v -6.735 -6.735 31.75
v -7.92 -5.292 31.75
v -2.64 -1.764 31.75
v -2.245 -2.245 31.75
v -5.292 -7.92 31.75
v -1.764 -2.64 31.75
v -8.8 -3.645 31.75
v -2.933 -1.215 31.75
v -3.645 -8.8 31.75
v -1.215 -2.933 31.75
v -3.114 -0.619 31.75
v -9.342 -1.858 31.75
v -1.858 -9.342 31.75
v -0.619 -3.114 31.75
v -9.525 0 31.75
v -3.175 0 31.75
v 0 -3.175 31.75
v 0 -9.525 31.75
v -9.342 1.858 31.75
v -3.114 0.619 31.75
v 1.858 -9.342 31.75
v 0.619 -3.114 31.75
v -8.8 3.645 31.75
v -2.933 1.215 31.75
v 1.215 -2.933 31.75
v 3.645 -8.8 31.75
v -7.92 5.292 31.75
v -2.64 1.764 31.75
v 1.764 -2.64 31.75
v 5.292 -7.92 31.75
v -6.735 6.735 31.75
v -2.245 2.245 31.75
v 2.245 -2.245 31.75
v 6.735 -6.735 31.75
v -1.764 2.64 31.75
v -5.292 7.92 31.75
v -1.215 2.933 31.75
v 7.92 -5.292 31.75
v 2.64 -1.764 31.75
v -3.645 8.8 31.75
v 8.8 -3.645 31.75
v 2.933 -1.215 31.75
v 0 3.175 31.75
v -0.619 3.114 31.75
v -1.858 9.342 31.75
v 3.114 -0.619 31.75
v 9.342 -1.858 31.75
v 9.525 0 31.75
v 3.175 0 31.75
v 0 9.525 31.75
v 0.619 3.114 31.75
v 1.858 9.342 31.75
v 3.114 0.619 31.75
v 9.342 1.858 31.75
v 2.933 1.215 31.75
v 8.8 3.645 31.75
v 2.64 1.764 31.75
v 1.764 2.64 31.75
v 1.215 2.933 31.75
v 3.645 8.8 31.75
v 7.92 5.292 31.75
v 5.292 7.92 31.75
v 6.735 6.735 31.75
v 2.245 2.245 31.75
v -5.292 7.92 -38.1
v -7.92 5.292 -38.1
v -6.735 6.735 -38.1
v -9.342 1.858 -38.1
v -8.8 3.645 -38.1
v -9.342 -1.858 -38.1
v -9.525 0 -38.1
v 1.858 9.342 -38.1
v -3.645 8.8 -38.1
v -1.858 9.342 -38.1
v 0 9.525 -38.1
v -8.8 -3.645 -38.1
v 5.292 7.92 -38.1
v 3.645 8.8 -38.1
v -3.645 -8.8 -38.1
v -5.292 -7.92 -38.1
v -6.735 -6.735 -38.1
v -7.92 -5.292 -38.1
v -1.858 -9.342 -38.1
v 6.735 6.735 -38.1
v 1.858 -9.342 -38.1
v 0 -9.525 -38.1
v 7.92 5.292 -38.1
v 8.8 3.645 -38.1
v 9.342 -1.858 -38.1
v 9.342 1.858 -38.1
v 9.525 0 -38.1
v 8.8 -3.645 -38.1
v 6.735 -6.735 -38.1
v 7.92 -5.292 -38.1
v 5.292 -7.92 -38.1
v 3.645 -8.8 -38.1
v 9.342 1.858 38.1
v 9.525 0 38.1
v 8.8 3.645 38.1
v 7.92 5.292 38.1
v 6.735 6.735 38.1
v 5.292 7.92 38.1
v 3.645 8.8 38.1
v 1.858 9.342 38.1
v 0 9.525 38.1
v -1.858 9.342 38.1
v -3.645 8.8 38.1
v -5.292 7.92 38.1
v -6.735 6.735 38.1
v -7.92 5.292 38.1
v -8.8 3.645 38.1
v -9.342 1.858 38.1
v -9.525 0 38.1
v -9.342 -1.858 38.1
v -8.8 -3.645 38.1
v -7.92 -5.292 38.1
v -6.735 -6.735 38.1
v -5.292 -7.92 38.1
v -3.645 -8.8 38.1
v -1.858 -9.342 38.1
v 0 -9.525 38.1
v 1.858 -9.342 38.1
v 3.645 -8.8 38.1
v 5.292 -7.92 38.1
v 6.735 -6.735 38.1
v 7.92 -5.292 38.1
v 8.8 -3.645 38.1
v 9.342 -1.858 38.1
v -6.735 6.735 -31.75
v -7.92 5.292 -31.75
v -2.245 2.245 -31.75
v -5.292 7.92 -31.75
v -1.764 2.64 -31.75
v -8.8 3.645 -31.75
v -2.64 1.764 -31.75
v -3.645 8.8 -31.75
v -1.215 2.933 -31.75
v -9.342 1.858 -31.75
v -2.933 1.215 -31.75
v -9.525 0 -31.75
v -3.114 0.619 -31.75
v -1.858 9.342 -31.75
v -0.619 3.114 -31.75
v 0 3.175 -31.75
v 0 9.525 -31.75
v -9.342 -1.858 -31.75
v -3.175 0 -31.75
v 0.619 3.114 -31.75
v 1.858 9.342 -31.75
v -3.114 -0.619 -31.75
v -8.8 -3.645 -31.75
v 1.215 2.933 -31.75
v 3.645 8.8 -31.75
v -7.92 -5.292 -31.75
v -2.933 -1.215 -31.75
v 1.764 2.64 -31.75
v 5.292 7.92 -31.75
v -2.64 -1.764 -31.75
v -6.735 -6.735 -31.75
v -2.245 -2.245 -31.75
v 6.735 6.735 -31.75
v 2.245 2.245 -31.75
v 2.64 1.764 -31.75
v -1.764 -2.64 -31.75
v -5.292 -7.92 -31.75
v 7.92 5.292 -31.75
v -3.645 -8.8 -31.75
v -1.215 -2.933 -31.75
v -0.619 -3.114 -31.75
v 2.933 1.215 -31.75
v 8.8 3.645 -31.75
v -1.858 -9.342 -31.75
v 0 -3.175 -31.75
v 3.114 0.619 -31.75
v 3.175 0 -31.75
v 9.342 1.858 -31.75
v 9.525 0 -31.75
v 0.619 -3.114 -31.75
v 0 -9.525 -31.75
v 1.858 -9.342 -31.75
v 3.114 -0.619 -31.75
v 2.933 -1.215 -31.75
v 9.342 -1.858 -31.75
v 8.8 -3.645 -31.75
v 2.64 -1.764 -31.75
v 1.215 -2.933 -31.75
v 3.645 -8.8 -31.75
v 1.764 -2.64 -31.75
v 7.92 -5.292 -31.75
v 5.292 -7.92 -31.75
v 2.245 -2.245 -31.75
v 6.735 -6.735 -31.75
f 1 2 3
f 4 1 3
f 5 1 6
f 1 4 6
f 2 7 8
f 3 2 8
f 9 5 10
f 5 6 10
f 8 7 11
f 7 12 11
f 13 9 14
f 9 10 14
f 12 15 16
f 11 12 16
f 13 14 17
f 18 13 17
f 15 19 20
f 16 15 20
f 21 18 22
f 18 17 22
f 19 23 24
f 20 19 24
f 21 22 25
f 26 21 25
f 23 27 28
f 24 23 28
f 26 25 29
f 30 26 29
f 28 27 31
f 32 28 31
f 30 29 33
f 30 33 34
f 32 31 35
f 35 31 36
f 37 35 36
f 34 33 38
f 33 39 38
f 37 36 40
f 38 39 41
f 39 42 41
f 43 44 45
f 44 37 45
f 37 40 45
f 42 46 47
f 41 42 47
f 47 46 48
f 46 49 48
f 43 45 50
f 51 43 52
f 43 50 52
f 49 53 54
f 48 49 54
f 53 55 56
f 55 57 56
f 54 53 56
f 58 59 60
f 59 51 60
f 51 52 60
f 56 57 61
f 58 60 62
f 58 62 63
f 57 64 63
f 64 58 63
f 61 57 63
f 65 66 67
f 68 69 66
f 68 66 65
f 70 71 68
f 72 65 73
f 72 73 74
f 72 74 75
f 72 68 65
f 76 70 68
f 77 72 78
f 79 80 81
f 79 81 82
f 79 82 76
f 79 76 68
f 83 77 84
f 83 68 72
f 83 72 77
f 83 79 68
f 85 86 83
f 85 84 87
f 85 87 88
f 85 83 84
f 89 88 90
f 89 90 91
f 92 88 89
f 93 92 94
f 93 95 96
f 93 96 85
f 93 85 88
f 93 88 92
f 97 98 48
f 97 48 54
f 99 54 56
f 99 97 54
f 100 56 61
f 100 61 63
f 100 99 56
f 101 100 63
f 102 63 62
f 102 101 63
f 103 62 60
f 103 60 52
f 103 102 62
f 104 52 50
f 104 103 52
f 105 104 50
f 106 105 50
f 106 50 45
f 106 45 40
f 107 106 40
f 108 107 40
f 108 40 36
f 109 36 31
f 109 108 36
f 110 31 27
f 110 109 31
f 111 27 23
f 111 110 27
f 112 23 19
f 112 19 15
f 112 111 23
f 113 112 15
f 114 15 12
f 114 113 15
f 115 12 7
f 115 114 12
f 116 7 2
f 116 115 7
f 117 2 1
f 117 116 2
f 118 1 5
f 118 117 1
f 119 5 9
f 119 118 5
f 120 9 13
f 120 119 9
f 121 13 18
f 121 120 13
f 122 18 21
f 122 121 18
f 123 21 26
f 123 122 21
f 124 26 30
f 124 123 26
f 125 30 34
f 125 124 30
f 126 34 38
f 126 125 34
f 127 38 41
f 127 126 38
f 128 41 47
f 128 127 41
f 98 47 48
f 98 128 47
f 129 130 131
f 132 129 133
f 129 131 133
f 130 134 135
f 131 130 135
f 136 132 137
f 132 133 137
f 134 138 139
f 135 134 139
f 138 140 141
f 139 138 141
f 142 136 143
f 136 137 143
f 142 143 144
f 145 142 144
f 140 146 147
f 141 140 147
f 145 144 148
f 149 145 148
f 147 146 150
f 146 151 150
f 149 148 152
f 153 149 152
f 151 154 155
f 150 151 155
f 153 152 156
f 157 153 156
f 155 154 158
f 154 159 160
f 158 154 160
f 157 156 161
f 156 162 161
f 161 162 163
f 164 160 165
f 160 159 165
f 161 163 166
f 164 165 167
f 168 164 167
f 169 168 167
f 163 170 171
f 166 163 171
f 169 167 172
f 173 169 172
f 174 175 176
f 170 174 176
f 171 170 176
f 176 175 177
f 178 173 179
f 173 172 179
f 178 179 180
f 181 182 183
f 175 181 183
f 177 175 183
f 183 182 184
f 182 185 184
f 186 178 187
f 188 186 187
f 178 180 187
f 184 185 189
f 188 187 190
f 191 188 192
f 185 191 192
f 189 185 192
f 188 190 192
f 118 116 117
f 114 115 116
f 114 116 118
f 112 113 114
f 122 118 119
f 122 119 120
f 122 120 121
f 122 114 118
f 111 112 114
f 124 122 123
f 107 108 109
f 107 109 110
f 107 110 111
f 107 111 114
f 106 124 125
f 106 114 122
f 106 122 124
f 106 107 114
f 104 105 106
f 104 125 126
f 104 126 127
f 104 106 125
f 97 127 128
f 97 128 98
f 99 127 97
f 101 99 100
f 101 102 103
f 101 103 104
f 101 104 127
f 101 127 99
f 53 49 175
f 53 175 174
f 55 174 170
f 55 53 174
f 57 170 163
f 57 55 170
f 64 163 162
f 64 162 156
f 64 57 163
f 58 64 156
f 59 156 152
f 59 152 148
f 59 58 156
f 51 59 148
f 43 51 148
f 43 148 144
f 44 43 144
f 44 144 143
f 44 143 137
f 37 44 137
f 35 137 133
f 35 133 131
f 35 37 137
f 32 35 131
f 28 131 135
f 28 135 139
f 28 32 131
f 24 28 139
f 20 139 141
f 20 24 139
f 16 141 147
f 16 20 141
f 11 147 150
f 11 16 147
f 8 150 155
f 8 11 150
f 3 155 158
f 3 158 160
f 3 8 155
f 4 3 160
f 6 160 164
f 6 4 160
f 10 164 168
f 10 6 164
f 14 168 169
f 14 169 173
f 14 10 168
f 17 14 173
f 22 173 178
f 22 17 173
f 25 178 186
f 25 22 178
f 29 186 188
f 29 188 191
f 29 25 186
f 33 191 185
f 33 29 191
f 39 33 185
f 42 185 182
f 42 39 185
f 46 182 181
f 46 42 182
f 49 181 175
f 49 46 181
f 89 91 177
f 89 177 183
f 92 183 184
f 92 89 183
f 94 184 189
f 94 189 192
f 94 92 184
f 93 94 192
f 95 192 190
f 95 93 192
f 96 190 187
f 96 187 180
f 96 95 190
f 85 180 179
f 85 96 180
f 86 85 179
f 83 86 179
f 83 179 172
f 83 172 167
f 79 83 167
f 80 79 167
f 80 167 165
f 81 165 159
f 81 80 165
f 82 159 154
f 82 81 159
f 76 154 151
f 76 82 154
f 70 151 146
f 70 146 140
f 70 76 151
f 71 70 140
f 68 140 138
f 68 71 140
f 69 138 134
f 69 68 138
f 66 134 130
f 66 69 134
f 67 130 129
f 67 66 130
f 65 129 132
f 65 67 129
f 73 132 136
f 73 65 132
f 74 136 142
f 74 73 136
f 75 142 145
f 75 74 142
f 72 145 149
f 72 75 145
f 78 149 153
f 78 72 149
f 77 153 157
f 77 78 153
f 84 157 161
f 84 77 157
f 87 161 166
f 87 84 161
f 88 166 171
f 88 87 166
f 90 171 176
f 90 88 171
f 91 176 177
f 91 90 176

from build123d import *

# Parameters (mm, degrees)
F0_R     = 3.175
F1_DEPTH = 38.1
F2_R     = 9.525
F3_DEPTH = 6.35
F4_R     = 9.525
F5_DEPTH = 6.35


with BuildPart() as f1:
    # F0 (on Top) → F1 (new body, symmetric)
    with BuildSketch(Plane.XY):
        Circle(F0_R)
    extrude(amount=F1_DEPTH, both=True)

    # F2 (on face) → F3 (join)
    with BuildSketch(Plane(origin=(0, 0, -38.1), x_dir=(1, 0, 0), z_dir=(0, 0, -1))):
        Circle(F2_R)
    extrude(amount=-F3_DEPTH)

    # F4 (on face) → F5 (join)
    with BuildSketch(Plane.XY.offset(38.1)):
        Circle(F4_R)
    extrude(amount=-F5_DEPTH)


solid = f1.part
